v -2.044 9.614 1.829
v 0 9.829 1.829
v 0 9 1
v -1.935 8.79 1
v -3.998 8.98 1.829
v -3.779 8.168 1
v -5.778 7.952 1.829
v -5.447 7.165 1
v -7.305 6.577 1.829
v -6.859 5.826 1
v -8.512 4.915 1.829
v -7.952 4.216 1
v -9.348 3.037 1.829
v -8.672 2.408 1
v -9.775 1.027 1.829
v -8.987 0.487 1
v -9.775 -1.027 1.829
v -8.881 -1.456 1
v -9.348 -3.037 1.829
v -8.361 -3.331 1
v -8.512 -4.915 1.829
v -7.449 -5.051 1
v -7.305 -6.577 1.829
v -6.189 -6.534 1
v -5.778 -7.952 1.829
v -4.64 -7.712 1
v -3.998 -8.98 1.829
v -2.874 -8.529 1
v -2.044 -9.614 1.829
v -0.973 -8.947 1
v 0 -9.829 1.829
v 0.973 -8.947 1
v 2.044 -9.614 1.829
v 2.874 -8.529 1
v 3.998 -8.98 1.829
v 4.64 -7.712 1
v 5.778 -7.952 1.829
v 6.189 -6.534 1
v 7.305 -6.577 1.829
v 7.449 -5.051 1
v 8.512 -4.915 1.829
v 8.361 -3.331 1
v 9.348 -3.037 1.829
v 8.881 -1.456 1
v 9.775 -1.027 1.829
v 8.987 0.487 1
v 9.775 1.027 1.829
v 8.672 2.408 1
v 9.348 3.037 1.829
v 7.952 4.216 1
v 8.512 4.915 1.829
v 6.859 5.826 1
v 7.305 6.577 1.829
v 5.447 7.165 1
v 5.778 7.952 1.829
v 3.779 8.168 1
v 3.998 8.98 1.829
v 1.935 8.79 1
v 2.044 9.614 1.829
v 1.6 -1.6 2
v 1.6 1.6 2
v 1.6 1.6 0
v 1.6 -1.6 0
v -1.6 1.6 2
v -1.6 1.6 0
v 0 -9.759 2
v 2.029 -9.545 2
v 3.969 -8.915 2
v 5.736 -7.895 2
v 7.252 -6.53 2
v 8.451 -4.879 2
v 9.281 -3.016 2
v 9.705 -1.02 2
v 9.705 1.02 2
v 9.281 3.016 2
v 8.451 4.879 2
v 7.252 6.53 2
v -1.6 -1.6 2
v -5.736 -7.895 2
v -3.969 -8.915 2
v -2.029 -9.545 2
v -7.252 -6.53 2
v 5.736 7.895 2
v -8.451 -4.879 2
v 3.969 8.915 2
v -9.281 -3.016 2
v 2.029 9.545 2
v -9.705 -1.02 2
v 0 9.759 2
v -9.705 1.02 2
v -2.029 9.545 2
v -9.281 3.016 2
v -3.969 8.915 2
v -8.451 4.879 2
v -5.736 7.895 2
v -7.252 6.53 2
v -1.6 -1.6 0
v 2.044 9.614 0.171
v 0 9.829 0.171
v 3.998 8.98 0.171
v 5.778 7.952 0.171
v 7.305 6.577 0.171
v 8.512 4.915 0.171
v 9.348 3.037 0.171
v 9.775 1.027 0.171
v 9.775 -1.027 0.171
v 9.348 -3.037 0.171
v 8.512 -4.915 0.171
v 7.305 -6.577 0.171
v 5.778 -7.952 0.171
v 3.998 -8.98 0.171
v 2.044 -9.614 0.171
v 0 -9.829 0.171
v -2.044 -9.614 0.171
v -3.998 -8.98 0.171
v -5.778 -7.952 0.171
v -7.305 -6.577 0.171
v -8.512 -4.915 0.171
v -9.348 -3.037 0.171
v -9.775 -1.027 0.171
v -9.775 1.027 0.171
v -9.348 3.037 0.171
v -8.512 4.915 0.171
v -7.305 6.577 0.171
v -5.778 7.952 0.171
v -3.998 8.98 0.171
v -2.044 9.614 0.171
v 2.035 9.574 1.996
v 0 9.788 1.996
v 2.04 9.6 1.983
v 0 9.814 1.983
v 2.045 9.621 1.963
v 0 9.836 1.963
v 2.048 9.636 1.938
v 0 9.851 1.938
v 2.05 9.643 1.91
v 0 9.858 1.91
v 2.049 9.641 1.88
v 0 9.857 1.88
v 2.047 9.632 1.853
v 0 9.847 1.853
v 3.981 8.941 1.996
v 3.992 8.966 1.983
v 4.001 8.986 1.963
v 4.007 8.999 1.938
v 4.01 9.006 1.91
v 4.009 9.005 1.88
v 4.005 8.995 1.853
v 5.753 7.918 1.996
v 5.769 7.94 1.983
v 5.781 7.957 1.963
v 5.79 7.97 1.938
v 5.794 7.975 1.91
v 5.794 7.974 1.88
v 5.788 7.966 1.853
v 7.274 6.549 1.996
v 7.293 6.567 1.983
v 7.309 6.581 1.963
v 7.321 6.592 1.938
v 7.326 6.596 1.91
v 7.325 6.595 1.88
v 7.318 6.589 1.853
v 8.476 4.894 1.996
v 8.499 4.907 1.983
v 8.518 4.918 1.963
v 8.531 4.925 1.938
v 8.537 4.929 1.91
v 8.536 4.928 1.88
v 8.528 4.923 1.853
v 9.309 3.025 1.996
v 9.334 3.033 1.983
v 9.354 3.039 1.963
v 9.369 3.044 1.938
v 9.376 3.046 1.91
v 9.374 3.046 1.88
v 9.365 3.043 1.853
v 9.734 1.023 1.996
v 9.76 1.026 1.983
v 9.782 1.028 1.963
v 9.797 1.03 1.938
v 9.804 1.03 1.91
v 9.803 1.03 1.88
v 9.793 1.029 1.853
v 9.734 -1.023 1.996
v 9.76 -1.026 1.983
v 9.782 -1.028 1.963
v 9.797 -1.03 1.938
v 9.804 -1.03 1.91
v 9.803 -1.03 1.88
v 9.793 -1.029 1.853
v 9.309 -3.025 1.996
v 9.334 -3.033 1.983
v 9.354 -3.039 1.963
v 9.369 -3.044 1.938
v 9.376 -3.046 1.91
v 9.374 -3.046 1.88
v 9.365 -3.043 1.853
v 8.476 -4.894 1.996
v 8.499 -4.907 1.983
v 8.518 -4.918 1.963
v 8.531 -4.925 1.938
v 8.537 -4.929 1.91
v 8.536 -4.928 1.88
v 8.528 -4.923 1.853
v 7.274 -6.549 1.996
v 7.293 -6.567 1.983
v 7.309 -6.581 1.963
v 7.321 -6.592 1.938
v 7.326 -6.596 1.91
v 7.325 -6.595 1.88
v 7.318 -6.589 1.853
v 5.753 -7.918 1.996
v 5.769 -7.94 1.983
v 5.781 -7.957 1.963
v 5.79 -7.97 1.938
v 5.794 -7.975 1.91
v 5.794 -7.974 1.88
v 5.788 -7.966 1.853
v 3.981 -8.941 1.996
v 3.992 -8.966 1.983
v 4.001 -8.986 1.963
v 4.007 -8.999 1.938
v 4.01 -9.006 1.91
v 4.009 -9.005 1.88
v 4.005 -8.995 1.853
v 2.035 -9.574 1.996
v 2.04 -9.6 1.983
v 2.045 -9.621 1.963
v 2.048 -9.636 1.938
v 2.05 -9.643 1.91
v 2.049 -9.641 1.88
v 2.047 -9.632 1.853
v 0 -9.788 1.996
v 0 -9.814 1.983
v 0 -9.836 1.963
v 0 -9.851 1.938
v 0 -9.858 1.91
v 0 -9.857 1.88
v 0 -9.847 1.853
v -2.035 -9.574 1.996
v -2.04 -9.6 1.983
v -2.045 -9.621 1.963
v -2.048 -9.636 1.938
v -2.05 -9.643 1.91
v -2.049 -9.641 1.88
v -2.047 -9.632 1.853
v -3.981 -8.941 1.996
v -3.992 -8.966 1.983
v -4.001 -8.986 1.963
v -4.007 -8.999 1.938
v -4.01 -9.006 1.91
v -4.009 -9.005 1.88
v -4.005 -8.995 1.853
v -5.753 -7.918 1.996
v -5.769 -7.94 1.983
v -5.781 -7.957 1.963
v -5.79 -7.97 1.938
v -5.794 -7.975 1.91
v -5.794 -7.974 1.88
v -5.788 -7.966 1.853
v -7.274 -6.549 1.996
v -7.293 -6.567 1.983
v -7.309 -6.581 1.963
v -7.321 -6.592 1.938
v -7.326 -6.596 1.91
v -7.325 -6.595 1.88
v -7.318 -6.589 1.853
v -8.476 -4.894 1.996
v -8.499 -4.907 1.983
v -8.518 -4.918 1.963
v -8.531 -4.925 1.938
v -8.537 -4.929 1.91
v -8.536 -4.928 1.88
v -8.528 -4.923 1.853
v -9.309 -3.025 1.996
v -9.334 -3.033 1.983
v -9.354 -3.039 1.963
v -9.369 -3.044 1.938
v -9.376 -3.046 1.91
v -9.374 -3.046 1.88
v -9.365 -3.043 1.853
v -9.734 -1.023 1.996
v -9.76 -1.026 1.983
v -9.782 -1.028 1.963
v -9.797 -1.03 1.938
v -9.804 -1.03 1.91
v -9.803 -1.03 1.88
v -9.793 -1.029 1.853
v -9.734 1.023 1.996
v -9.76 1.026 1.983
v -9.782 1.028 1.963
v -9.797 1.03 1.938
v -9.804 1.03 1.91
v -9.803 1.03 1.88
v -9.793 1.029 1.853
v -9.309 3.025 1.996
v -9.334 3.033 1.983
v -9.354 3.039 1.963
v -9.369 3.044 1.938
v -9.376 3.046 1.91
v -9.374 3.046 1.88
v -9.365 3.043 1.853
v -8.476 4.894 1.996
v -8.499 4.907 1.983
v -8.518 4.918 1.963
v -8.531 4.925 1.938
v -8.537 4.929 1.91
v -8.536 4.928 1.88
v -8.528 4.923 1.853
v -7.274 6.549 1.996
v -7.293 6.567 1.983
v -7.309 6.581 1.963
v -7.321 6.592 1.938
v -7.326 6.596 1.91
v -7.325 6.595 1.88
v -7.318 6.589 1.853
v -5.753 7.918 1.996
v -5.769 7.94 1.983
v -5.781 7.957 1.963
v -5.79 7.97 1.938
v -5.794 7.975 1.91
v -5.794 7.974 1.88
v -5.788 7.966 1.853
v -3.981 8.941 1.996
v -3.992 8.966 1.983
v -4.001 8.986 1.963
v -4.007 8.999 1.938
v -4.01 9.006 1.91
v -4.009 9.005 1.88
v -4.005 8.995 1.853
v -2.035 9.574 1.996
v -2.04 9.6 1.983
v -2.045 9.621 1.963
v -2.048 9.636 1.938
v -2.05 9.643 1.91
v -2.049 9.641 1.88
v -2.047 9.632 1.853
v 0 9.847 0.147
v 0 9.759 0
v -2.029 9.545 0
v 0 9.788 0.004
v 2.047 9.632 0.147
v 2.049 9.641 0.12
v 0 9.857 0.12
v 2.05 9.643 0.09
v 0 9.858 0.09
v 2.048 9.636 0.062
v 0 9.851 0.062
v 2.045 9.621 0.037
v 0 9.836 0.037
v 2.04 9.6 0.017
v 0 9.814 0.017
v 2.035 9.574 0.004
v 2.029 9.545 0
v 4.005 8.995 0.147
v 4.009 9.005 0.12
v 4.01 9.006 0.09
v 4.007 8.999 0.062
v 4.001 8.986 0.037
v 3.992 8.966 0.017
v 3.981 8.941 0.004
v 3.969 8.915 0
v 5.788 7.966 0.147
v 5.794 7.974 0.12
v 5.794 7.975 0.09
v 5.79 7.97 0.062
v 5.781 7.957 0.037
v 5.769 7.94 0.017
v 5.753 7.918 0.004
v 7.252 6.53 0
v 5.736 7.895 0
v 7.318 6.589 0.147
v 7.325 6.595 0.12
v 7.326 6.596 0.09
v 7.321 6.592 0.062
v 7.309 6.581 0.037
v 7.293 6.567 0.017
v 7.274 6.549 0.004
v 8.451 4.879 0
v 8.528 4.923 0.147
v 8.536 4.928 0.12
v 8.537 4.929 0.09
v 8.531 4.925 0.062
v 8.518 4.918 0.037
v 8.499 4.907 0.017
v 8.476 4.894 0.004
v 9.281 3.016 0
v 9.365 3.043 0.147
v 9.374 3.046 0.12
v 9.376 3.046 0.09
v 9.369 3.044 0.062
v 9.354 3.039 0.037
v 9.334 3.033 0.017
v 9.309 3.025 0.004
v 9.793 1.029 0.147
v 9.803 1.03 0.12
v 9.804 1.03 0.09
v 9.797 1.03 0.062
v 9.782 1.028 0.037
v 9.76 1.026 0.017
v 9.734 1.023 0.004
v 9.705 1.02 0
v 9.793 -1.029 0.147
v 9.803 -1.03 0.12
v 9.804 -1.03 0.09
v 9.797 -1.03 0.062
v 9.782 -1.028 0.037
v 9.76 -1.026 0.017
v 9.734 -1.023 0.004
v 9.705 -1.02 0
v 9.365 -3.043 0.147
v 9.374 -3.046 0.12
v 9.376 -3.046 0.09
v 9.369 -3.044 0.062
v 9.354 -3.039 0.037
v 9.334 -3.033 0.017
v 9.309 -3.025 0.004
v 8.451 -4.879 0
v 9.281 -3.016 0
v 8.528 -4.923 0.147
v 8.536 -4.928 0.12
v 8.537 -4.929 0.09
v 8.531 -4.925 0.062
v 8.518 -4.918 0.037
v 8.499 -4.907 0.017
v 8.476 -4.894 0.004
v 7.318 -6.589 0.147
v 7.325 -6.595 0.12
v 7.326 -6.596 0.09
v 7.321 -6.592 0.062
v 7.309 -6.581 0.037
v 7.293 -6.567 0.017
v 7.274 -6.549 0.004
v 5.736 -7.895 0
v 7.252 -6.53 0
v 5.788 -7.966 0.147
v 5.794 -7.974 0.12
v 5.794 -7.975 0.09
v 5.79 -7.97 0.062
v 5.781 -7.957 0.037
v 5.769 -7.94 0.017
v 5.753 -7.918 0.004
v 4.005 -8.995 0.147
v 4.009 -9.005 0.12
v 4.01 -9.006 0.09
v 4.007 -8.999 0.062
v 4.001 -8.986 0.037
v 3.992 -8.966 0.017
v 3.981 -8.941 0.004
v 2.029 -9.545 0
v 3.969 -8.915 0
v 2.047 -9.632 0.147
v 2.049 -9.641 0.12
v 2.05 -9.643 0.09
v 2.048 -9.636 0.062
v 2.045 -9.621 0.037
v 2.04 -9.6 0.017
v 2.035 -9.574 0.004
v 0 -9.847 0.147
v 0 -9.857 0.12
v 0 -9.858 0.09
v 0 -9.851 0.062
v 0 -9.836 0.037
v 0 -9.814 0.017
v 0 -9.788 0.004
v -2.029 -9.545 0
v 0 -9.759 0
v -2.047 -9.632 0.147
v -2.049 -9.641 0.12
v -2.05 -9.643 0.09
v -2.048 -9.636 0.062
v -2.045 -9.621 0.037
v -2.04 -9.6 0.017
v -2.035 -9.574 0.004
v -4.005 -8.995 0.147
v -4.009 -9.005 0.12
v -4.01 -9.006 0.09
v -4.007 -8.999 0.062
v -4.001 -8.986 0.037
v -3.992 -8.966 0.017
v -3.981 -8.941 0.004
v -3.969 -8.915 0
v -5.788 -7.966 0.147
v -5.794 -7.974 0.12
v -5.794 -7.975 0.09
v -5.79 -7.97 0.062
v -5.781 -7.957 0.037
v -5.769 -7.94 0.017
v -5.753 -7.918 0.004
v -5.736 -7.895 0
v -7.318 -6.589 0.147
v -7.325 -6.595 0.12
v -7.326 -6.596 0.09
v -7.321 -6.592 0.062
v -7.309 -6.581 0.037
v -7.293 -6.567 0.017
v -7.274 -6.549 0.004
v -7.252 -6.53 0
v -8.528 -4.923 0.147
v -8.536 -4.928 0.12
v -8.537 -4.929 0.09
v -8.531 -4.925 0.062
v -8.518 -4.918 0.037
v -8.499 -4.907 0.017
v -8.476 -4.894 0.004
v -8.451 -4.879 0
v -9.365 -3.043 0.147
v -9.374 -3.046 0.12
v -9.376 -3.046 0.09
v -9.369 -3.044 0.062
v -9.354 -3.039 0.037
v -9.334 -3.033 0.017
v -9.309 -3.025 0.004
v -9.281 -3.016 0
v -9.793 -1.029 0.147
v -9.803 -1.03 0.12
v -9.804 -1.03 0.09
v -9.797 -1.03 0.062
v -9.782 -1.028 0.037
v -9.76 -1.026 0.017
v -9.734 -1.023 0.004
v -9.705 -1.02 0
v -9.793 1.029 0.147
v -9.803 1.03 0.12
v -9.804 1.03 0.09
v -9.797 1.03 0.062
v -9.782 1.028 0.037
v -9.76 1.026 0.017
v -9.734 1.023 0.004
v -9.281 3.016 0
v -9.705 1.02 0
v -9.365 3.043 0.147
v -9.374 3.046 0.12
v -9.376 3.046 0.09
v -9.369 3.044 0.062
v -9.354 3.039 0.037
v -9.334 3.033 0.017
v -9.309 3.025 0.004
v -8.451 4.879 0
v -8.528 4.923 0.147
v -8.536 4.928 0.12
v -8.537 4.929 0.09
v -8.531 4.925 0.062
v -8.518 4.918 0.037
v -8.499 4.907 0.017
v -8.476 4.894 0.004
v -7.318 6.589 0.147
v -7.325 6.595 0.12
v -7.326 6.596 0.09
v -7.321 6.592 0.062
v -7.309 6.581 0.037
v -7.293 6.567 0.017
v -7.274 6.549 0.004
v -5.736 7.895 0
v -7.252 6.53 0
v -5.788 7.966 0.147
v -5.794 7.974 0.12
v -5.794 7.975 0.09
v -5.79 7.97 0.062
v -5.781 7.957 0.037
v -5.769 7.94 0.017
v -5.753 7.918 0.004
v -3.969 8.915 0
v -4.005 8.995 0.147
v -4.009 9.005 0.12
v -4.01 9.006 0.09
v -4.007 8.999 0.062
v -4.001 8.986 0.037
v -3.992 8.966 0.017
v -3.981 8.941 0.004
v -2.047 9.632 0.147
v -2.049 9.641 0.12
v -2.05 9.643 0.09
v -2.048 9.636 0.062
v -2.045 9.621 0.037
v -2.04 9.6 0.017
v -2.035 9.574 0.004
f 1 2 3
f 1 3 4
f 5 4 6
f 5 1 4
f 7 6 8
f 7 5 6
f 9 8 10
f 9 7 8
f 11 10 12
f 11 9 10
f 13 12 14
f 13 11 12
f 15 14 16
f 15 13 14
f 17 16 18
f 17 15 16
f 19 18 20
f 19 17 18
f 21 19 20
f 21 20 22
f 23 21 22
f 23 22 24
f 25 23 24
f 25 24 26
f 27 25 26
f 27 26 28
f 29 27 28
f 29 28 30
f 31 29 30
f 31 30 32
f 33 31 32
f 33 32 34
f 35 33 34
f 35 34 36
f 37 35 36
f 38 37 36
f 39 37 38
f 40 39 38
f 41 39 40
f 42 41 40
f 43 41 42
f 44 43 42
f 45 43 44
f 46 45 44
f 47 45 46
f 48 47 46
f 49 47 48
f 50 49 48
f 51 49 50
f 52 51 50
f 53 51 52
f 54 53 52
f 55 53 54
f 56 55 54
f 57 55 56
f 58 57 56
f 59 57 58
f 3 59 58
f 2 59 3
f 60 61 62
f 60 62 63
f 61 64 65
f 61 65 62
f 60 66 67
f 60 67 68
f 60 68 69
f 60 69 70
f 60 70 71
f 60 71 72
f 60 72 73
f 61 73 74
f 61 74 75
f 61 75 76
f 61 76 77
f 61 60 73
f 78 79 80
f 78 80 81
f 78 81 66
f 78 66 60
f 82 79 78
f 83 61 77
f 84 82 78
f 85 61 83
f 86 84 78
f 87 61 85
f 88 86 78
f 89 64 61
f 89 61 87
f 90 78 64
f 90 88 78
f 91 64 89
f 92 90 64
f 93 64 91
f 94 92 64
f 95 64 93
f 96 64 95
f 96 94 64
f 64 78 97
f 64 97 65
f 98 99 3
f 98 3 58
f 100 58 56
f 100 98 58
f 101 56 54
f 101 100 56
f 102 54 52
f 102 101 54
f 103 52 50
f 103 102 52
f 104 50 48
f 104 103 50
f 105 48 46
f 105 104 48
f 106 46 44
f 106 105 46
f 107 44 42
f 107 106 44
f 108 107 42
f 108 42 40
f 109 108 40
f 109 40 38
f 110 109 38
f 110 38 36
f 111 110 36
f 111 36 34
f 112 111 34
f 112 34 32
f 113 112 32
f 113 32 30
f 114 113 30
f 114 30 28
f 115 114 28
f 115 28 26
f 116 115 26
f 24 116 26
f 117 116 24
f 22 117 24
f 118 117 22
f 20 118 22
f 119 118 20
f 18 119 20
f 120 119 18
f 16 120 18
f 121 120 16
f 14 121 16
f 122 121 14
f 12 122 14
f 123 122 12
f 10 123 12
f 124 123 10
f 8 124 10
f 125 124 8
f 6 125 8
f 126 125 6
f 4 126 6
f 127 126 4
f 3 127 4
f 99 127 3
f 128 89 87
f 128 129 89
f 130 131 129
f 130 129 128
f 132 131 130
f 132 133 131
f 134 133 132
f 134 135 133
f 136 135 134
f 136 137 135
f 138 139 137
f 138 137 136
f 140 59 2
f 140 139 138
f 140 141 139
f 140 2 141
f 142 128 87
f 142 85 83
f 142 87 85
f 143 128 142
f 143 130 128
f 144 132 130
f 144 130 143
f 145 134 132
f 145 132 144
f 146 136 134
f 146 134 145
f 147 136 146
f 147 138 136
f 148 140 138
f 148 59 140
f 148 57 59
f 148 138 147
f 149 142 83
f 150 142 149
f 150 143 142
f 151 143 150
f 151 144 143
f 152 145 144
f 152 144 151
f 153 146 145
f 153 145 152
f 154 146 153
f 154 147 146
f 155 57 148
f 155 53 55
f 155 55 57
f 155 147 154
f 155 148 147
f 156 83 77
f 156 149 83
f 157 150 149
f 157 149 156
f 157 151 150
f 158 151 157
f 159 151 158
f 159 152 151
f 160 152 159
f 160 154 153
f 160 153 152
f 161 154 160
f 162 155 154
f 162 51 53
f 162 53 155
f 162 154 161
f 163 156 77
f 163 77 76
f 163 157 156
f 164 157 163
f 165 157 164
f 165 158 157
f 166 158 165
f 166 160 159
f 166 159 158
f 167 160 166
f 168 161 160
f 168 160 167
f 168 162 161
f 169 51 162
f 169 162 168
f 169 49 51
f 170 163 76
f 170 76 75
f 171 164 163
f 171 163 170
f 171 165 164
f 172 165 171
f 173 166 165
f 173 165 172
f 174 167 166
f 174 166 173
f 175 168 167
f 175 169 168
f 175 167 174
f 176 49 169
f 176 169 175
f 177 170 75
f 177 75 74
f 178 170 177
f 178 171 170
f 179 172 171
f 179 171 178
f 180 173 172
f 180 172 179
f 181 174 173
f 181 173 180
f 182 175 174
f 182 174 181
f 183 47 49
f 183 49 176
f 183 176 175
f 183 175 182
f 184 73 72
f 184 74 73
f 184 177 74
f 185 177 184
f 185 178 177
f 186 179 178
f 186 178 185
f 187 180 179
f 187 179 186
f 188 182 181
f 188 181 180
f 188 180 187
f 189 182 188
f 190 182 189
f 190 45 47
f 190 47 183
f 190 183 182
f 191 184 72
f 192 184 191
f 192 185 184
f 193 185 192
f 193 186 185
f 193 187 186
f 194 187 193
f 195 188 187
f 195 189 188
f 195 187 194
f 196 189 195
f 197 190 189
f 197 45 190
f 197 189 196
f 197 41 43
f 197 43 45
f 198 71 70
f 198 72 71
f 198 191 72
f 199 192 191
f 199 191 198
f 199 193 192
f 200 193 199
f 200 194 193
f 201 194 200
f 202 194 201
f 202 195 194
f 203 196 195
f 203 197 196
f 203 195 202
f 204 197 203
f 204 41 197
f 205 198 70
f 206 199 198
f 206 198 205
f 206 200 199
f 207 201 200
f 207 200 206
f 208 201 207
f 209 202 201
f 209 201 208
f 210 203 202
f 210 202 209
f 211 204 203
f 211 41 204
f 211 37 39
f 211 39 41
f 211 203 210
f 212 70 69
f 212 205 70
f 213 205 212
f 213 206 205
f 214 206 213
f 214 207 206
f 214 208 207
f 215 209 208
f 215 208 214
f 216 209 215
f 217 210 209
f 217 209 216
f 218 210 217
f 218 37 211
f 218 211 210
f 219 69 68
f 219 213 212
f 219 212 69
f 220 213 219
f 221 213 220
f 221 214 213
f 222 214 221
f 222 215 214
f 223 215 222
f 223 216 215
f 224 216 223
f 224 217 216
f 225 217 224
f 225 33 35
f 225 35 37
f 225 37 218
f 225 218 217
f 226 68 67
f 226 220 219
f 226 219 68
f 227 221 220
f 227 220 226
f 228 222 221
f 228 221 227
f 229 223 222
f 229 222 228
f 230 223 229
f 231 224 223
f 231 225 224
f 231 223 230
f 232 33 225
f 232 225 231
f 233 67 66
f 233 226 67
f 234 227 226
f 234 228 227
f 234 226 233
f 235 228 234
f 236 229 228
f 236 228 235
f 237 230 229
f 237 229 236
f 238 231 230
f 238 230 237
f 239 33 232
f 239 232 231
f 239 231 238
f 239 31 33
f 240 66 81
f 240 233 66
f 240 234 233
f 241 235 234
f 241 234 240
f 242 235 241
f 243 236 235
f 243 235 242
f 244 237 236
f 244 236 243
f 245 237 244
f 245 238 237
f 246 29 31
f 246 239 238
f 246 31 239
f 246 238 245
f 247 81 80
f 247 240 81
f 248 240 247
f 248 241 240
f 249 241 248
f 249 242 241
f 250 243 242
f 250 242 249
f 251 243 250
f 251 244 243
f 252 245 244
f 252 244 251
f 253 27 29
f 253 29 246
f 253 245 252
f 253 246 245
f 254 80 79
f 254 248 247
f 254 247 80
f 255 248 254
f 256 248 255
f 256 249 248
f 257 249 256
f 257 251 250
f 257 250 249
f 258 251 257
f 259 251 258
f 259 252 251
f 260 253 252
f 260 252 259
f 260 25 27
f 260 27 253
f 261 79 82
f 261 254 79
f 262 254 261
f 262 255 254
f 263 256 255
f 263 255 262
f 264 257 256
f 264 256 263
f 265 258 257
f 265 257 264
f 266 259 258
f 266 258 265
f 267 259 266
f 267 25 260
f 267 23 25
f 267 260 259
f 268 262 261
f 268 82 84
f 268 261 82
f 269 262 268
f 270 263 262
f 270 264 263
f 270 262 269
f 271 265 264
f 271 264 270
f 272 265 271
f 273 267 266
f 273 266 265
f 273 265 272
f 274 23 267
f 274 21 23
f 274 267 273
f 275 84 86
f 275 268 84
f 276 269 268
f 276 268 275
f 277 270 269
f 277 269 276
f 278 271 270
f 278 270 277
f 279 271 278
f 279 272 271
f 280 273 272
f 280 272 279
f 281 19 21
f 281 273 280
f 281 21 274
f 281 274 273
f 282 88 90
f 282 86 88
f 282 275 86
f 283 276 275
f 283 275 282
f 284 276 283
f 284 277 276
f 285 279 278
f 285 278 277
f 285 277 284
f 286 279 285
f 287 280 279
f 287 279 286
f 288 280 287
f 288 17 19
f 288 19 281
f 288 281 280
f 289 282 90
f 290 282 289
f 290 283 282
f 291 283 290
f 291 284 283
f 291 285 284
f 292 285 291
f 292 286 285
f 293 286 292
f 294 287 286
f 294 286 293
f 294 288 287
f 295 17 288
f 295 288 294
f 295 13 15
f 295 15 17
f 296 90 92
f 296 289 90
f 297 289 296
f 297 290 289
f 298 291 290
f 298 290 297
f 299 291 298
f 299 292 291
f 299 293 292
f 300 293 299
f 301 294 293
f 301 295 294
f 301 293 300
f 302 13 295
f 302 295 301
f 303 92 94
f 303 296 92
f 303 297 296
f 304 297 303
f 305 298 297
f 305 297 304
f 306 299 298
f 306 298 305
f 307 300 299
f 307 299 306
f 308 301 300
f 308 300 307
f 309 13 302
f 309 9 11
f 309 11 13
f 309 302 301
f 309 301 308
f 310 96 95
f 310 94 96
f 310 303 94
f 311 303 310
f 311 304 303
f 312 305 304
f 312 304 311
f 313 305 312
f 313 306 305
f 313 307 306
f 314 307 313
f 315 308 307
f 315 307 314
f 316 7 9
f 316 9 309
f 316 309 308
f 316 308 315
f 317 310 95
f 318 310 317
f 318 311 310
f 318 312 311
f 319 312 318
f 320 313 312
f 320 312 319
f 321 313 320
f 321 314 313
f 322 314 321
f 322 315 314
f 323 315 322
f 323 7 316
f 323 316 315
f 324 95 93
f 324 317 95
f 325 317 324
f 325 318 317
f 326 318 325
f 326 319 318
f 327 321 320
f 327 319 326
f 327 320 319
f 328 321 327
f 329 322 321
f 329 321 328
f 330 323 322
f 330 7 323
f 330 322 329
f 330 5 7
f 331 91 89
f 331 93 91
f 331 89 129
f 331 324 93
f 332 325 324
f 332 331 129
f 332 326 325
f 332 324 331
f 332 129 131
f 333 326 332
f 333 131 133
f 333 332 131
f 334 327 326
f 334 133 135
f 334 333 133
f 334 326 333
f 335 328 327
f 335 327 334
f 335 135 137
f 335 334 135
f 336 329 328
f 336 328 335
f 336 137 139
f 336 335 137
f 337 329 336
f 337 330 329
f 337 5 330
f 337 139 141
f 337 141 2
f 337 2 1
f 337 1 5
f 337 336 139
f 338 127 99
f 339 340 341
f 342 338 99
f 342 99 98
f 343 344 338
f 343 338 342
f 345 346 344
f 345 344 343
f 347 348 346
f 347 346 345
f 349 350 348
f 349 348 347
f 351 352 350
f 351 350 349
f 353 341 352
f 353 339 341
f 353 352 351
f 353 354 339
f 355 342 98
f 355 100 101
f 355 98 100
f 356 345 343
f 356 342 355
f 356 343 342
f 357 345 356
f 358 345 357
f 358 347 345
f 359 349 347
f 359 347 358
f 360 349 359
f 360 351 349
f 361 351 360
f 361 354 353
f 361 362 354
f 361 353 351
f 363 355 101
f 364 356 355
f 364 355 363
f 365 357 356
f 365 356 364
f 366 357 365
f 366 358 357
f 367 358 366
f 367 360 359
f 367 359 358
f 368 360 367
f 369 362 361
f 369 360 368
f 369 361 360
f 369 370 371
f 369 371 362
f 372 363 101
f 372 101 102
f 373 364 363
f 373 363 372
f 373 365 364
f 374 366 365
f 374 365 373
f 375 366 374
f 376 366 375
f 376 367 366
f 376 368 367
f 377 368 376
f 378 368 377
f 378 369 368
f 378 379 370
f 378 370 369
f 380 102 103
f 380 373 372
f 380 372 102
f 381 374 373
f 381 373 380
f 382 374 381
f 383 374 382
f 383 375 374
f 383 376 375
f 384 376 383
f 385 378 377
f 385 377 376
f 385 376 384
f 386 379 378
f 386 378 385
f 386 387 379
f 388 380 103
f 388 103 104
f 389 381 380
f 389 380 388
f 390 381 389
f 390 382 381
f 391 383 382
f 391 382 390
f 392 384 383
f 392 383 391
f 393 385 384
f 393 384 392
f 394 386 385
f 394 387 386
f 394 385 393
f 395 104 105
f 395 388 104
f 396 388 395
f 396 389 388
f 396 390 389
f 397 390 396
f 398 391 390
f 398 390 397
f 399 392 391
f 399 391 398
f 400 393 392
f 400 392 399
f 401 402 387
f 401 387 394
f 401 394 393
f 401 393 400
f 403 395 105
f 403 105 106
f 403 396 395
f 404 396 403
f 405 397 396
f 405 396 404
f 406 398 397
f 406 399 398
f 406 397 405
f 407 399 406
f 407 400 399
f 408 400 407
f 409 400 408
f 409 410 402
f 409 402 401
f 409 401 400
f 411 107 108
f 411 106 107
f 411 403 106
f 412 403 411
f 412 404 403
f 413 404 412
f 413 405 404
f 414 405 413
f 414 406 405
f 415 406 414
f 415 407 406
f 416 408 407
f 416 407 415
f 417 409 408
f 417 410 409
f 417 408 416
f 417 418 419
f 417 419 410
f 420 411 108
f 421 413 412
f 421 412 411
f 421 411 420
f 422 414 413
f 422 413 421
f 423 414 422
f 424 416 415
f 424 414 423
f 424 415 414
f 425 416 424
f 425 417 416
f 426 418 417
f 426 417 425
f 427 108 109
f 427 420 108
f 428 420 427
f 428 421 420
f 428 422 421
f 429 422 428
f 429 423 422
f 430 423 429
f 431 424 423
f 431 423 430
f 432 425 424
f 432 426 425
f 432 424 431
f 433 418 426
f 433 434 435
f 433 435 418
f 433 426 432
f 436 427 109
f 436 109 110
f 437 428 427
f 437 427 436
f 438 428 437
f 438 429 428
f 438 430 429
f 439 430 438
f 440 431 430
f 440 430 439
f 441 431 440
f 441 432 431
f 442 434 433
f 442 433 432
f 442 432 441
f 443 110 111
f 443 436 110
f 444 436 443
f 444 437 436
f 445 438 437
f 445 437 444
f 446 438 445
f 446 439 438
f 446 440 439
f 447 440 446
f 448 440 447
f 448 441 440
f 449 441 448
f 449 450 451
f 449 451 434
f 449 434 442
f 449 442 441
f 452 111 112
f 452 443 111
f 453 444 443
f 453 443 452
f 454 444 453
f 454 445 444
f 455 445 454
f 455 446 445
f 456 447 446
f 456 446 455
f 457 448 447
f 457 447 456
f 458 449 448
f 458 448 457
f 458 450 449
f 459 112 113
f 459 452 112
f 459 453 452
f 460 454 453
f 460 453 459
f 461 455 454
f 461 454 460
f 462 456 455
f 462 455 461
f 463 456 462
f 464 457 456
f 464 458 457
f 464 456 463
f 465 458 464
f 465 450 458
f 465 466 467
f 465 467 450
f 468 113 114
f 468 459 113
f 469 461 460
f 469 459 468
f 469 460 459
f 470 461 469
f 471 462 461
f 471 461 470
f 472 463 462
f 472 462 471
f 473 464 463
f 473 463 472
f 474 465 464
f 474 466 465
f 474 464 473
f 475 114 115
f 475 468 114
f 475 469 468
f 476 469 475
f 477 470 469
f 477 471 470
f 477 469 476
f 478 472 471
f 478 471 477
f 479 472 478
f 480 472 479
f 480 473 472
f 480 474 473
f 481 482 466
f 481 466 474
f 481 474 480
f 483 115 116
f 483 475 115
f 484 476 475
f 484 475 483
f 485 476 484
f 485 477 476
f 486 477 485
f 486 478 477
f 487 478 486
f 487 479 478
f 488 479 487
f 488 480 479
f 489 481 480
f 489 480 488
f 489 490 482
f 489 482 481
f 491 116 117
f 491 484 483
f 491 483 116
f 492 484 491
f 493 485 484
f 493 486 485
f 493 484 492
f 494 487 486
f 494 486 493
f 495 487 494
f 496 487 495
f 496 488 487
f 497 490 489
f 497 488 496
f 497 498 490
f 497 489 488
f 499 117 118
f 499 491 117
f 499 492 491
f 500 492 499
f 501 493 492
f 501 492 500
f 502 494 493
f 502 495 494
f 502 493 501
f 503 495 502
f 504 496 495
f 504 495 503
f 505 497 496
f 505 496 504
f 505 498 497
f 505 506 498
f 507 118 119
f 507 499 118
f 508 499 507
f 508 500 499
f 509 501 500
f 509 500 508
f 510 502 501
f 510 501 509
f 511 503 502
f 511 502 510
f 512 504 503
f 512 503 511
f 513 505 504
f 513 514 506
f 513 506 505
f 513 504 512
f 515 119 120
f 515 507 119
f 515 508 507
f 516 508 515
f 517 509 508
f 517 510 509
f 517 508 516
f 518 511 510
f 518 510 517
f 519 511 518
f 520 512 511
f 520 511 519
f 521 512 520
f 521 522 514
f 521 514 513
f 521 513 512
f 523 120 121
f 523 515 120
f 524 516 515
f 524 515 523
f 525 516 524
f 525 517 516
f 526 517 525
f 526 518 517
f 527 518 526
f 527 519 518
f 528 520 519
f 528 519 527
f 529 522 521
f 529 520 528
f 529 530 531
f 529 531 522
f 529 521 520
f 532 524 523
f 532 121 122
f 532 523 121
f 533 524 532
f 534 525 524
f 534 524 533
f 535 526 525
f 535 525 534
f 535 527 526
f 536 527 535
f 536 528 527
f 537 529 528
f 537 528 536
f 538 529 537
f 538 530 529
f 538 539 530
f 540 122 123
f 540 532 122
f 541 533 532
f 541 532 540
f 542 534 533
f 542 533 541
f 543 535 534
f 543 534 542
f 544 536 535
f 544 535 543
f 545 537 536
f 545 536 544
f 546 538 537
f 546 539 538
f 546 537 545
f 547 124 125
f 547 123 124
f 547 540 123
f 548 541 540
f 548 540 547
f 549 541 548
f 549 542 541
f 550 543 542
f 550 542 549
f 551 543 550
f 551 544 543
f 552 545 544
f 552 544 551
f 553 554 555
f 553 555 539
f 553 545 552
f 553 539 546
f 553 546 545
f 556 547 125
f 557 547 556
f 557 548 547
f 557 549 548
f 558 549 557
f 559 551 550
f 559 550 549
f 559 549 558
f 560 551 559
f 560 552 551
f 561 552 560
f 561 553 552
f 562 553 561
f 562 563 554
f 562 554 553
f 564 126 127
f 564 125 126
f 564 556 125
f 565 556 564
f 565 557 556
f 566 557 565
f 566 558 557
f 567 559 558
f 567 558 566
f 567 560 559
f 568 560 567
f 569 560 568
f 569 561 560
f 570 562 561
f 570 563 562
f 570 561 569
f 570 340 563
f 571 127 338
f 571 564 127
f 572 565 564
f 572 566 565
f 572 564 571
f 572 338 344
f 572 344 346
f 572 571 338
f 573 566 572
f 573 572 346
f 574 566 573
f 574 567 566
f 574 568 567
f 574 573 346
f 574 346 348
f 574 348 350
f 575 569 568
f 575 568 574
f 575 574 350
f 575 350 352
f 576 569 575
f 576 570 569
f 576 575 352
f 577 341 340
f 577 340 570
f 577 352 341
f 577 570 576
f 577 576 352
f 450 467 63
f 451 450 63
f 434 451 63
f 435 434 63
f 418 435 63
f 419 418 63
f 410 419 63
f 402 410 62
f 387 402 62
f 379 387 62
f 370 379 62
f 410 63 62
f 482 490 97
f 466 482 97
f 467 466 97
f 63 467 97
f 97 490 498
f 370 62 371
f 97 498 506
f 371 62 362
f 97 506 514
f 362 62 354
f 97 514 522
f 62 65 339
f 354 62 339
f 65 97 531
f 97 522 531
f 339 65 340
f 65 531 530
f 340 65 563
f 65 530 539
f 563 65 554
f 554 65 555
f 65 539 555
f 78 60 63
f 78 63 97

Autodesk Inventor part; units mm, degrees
ref_plane "YZ Plane" through (0, 0, 0) normal (1, 0, 0) x (0, 1, 0)
ref_plane "XZ Plane" through (0, 0, 0) normal (0, 1, 0) x (-1, 0, 0)
ref_plane "XY Plane" through (0, 0, 0) normal (0, 0, 1) x (1, 0, 0)
sketch "Sketch1" plane through (0, 0, 0) normal (1, 0, 0) x (0, 1, 0)
  line L0 (0, 0) -> (0, 2)
  line L1 (0, 1) -> (9, 1) construction
  line L2 (10, 2) -> (9, 1)
  line L3 (9, 1) -> (10, 0)
  line L4 (10, 2) -> (0, 2)
  line L5 (10, 0) -> (0, 0)
  dimension "d0" = 2
  dimension "d2" = 1
  dimension "d3" = 1
  dimension "d4" = 1
  dimension "d5" = 10
revolve "Revolution1" add sketch "Sketch1" angle 360 about axis through (0, 0, 0) along (0, 0, 1)
fillet "Fillet1" radius 0.1 2 edges at (0, -10, 2) (0, -10, 0)
sketch "Sketch2" plane through (0, 0, 2) normal (0, 0, 1) x (1, 0, 0)
  circle A0 centre (0, 0) radius 9 construction
  line L0 (-1.6, 1.6) -> (1.6, 1.6)
  line L1 (1.6, 1.6) -> (1.6, -1.6)
  line L2 (1.6, -1.6) -> (-1.6, -1.6)
  line L3 (-1.6, -1.6) -> (-1.6, 1.6)
  line L4 (-1.6, 1.6) -> (1.6, -1.6) construction
  line L5 (1.6, 1.6) -> (-1.6, -1.6) construction
  dimension "d8" = 3.2
  dimension "d9" = 3.2
extrude "Extrusion1" cut sketch "Sketch2" against normal through all
equation "\"d3\" = d2"
equation "\"d4\" = d3"
equation "\"d9\" = d8"
properties part number "pulley" material "PC/ABS Plastic"
